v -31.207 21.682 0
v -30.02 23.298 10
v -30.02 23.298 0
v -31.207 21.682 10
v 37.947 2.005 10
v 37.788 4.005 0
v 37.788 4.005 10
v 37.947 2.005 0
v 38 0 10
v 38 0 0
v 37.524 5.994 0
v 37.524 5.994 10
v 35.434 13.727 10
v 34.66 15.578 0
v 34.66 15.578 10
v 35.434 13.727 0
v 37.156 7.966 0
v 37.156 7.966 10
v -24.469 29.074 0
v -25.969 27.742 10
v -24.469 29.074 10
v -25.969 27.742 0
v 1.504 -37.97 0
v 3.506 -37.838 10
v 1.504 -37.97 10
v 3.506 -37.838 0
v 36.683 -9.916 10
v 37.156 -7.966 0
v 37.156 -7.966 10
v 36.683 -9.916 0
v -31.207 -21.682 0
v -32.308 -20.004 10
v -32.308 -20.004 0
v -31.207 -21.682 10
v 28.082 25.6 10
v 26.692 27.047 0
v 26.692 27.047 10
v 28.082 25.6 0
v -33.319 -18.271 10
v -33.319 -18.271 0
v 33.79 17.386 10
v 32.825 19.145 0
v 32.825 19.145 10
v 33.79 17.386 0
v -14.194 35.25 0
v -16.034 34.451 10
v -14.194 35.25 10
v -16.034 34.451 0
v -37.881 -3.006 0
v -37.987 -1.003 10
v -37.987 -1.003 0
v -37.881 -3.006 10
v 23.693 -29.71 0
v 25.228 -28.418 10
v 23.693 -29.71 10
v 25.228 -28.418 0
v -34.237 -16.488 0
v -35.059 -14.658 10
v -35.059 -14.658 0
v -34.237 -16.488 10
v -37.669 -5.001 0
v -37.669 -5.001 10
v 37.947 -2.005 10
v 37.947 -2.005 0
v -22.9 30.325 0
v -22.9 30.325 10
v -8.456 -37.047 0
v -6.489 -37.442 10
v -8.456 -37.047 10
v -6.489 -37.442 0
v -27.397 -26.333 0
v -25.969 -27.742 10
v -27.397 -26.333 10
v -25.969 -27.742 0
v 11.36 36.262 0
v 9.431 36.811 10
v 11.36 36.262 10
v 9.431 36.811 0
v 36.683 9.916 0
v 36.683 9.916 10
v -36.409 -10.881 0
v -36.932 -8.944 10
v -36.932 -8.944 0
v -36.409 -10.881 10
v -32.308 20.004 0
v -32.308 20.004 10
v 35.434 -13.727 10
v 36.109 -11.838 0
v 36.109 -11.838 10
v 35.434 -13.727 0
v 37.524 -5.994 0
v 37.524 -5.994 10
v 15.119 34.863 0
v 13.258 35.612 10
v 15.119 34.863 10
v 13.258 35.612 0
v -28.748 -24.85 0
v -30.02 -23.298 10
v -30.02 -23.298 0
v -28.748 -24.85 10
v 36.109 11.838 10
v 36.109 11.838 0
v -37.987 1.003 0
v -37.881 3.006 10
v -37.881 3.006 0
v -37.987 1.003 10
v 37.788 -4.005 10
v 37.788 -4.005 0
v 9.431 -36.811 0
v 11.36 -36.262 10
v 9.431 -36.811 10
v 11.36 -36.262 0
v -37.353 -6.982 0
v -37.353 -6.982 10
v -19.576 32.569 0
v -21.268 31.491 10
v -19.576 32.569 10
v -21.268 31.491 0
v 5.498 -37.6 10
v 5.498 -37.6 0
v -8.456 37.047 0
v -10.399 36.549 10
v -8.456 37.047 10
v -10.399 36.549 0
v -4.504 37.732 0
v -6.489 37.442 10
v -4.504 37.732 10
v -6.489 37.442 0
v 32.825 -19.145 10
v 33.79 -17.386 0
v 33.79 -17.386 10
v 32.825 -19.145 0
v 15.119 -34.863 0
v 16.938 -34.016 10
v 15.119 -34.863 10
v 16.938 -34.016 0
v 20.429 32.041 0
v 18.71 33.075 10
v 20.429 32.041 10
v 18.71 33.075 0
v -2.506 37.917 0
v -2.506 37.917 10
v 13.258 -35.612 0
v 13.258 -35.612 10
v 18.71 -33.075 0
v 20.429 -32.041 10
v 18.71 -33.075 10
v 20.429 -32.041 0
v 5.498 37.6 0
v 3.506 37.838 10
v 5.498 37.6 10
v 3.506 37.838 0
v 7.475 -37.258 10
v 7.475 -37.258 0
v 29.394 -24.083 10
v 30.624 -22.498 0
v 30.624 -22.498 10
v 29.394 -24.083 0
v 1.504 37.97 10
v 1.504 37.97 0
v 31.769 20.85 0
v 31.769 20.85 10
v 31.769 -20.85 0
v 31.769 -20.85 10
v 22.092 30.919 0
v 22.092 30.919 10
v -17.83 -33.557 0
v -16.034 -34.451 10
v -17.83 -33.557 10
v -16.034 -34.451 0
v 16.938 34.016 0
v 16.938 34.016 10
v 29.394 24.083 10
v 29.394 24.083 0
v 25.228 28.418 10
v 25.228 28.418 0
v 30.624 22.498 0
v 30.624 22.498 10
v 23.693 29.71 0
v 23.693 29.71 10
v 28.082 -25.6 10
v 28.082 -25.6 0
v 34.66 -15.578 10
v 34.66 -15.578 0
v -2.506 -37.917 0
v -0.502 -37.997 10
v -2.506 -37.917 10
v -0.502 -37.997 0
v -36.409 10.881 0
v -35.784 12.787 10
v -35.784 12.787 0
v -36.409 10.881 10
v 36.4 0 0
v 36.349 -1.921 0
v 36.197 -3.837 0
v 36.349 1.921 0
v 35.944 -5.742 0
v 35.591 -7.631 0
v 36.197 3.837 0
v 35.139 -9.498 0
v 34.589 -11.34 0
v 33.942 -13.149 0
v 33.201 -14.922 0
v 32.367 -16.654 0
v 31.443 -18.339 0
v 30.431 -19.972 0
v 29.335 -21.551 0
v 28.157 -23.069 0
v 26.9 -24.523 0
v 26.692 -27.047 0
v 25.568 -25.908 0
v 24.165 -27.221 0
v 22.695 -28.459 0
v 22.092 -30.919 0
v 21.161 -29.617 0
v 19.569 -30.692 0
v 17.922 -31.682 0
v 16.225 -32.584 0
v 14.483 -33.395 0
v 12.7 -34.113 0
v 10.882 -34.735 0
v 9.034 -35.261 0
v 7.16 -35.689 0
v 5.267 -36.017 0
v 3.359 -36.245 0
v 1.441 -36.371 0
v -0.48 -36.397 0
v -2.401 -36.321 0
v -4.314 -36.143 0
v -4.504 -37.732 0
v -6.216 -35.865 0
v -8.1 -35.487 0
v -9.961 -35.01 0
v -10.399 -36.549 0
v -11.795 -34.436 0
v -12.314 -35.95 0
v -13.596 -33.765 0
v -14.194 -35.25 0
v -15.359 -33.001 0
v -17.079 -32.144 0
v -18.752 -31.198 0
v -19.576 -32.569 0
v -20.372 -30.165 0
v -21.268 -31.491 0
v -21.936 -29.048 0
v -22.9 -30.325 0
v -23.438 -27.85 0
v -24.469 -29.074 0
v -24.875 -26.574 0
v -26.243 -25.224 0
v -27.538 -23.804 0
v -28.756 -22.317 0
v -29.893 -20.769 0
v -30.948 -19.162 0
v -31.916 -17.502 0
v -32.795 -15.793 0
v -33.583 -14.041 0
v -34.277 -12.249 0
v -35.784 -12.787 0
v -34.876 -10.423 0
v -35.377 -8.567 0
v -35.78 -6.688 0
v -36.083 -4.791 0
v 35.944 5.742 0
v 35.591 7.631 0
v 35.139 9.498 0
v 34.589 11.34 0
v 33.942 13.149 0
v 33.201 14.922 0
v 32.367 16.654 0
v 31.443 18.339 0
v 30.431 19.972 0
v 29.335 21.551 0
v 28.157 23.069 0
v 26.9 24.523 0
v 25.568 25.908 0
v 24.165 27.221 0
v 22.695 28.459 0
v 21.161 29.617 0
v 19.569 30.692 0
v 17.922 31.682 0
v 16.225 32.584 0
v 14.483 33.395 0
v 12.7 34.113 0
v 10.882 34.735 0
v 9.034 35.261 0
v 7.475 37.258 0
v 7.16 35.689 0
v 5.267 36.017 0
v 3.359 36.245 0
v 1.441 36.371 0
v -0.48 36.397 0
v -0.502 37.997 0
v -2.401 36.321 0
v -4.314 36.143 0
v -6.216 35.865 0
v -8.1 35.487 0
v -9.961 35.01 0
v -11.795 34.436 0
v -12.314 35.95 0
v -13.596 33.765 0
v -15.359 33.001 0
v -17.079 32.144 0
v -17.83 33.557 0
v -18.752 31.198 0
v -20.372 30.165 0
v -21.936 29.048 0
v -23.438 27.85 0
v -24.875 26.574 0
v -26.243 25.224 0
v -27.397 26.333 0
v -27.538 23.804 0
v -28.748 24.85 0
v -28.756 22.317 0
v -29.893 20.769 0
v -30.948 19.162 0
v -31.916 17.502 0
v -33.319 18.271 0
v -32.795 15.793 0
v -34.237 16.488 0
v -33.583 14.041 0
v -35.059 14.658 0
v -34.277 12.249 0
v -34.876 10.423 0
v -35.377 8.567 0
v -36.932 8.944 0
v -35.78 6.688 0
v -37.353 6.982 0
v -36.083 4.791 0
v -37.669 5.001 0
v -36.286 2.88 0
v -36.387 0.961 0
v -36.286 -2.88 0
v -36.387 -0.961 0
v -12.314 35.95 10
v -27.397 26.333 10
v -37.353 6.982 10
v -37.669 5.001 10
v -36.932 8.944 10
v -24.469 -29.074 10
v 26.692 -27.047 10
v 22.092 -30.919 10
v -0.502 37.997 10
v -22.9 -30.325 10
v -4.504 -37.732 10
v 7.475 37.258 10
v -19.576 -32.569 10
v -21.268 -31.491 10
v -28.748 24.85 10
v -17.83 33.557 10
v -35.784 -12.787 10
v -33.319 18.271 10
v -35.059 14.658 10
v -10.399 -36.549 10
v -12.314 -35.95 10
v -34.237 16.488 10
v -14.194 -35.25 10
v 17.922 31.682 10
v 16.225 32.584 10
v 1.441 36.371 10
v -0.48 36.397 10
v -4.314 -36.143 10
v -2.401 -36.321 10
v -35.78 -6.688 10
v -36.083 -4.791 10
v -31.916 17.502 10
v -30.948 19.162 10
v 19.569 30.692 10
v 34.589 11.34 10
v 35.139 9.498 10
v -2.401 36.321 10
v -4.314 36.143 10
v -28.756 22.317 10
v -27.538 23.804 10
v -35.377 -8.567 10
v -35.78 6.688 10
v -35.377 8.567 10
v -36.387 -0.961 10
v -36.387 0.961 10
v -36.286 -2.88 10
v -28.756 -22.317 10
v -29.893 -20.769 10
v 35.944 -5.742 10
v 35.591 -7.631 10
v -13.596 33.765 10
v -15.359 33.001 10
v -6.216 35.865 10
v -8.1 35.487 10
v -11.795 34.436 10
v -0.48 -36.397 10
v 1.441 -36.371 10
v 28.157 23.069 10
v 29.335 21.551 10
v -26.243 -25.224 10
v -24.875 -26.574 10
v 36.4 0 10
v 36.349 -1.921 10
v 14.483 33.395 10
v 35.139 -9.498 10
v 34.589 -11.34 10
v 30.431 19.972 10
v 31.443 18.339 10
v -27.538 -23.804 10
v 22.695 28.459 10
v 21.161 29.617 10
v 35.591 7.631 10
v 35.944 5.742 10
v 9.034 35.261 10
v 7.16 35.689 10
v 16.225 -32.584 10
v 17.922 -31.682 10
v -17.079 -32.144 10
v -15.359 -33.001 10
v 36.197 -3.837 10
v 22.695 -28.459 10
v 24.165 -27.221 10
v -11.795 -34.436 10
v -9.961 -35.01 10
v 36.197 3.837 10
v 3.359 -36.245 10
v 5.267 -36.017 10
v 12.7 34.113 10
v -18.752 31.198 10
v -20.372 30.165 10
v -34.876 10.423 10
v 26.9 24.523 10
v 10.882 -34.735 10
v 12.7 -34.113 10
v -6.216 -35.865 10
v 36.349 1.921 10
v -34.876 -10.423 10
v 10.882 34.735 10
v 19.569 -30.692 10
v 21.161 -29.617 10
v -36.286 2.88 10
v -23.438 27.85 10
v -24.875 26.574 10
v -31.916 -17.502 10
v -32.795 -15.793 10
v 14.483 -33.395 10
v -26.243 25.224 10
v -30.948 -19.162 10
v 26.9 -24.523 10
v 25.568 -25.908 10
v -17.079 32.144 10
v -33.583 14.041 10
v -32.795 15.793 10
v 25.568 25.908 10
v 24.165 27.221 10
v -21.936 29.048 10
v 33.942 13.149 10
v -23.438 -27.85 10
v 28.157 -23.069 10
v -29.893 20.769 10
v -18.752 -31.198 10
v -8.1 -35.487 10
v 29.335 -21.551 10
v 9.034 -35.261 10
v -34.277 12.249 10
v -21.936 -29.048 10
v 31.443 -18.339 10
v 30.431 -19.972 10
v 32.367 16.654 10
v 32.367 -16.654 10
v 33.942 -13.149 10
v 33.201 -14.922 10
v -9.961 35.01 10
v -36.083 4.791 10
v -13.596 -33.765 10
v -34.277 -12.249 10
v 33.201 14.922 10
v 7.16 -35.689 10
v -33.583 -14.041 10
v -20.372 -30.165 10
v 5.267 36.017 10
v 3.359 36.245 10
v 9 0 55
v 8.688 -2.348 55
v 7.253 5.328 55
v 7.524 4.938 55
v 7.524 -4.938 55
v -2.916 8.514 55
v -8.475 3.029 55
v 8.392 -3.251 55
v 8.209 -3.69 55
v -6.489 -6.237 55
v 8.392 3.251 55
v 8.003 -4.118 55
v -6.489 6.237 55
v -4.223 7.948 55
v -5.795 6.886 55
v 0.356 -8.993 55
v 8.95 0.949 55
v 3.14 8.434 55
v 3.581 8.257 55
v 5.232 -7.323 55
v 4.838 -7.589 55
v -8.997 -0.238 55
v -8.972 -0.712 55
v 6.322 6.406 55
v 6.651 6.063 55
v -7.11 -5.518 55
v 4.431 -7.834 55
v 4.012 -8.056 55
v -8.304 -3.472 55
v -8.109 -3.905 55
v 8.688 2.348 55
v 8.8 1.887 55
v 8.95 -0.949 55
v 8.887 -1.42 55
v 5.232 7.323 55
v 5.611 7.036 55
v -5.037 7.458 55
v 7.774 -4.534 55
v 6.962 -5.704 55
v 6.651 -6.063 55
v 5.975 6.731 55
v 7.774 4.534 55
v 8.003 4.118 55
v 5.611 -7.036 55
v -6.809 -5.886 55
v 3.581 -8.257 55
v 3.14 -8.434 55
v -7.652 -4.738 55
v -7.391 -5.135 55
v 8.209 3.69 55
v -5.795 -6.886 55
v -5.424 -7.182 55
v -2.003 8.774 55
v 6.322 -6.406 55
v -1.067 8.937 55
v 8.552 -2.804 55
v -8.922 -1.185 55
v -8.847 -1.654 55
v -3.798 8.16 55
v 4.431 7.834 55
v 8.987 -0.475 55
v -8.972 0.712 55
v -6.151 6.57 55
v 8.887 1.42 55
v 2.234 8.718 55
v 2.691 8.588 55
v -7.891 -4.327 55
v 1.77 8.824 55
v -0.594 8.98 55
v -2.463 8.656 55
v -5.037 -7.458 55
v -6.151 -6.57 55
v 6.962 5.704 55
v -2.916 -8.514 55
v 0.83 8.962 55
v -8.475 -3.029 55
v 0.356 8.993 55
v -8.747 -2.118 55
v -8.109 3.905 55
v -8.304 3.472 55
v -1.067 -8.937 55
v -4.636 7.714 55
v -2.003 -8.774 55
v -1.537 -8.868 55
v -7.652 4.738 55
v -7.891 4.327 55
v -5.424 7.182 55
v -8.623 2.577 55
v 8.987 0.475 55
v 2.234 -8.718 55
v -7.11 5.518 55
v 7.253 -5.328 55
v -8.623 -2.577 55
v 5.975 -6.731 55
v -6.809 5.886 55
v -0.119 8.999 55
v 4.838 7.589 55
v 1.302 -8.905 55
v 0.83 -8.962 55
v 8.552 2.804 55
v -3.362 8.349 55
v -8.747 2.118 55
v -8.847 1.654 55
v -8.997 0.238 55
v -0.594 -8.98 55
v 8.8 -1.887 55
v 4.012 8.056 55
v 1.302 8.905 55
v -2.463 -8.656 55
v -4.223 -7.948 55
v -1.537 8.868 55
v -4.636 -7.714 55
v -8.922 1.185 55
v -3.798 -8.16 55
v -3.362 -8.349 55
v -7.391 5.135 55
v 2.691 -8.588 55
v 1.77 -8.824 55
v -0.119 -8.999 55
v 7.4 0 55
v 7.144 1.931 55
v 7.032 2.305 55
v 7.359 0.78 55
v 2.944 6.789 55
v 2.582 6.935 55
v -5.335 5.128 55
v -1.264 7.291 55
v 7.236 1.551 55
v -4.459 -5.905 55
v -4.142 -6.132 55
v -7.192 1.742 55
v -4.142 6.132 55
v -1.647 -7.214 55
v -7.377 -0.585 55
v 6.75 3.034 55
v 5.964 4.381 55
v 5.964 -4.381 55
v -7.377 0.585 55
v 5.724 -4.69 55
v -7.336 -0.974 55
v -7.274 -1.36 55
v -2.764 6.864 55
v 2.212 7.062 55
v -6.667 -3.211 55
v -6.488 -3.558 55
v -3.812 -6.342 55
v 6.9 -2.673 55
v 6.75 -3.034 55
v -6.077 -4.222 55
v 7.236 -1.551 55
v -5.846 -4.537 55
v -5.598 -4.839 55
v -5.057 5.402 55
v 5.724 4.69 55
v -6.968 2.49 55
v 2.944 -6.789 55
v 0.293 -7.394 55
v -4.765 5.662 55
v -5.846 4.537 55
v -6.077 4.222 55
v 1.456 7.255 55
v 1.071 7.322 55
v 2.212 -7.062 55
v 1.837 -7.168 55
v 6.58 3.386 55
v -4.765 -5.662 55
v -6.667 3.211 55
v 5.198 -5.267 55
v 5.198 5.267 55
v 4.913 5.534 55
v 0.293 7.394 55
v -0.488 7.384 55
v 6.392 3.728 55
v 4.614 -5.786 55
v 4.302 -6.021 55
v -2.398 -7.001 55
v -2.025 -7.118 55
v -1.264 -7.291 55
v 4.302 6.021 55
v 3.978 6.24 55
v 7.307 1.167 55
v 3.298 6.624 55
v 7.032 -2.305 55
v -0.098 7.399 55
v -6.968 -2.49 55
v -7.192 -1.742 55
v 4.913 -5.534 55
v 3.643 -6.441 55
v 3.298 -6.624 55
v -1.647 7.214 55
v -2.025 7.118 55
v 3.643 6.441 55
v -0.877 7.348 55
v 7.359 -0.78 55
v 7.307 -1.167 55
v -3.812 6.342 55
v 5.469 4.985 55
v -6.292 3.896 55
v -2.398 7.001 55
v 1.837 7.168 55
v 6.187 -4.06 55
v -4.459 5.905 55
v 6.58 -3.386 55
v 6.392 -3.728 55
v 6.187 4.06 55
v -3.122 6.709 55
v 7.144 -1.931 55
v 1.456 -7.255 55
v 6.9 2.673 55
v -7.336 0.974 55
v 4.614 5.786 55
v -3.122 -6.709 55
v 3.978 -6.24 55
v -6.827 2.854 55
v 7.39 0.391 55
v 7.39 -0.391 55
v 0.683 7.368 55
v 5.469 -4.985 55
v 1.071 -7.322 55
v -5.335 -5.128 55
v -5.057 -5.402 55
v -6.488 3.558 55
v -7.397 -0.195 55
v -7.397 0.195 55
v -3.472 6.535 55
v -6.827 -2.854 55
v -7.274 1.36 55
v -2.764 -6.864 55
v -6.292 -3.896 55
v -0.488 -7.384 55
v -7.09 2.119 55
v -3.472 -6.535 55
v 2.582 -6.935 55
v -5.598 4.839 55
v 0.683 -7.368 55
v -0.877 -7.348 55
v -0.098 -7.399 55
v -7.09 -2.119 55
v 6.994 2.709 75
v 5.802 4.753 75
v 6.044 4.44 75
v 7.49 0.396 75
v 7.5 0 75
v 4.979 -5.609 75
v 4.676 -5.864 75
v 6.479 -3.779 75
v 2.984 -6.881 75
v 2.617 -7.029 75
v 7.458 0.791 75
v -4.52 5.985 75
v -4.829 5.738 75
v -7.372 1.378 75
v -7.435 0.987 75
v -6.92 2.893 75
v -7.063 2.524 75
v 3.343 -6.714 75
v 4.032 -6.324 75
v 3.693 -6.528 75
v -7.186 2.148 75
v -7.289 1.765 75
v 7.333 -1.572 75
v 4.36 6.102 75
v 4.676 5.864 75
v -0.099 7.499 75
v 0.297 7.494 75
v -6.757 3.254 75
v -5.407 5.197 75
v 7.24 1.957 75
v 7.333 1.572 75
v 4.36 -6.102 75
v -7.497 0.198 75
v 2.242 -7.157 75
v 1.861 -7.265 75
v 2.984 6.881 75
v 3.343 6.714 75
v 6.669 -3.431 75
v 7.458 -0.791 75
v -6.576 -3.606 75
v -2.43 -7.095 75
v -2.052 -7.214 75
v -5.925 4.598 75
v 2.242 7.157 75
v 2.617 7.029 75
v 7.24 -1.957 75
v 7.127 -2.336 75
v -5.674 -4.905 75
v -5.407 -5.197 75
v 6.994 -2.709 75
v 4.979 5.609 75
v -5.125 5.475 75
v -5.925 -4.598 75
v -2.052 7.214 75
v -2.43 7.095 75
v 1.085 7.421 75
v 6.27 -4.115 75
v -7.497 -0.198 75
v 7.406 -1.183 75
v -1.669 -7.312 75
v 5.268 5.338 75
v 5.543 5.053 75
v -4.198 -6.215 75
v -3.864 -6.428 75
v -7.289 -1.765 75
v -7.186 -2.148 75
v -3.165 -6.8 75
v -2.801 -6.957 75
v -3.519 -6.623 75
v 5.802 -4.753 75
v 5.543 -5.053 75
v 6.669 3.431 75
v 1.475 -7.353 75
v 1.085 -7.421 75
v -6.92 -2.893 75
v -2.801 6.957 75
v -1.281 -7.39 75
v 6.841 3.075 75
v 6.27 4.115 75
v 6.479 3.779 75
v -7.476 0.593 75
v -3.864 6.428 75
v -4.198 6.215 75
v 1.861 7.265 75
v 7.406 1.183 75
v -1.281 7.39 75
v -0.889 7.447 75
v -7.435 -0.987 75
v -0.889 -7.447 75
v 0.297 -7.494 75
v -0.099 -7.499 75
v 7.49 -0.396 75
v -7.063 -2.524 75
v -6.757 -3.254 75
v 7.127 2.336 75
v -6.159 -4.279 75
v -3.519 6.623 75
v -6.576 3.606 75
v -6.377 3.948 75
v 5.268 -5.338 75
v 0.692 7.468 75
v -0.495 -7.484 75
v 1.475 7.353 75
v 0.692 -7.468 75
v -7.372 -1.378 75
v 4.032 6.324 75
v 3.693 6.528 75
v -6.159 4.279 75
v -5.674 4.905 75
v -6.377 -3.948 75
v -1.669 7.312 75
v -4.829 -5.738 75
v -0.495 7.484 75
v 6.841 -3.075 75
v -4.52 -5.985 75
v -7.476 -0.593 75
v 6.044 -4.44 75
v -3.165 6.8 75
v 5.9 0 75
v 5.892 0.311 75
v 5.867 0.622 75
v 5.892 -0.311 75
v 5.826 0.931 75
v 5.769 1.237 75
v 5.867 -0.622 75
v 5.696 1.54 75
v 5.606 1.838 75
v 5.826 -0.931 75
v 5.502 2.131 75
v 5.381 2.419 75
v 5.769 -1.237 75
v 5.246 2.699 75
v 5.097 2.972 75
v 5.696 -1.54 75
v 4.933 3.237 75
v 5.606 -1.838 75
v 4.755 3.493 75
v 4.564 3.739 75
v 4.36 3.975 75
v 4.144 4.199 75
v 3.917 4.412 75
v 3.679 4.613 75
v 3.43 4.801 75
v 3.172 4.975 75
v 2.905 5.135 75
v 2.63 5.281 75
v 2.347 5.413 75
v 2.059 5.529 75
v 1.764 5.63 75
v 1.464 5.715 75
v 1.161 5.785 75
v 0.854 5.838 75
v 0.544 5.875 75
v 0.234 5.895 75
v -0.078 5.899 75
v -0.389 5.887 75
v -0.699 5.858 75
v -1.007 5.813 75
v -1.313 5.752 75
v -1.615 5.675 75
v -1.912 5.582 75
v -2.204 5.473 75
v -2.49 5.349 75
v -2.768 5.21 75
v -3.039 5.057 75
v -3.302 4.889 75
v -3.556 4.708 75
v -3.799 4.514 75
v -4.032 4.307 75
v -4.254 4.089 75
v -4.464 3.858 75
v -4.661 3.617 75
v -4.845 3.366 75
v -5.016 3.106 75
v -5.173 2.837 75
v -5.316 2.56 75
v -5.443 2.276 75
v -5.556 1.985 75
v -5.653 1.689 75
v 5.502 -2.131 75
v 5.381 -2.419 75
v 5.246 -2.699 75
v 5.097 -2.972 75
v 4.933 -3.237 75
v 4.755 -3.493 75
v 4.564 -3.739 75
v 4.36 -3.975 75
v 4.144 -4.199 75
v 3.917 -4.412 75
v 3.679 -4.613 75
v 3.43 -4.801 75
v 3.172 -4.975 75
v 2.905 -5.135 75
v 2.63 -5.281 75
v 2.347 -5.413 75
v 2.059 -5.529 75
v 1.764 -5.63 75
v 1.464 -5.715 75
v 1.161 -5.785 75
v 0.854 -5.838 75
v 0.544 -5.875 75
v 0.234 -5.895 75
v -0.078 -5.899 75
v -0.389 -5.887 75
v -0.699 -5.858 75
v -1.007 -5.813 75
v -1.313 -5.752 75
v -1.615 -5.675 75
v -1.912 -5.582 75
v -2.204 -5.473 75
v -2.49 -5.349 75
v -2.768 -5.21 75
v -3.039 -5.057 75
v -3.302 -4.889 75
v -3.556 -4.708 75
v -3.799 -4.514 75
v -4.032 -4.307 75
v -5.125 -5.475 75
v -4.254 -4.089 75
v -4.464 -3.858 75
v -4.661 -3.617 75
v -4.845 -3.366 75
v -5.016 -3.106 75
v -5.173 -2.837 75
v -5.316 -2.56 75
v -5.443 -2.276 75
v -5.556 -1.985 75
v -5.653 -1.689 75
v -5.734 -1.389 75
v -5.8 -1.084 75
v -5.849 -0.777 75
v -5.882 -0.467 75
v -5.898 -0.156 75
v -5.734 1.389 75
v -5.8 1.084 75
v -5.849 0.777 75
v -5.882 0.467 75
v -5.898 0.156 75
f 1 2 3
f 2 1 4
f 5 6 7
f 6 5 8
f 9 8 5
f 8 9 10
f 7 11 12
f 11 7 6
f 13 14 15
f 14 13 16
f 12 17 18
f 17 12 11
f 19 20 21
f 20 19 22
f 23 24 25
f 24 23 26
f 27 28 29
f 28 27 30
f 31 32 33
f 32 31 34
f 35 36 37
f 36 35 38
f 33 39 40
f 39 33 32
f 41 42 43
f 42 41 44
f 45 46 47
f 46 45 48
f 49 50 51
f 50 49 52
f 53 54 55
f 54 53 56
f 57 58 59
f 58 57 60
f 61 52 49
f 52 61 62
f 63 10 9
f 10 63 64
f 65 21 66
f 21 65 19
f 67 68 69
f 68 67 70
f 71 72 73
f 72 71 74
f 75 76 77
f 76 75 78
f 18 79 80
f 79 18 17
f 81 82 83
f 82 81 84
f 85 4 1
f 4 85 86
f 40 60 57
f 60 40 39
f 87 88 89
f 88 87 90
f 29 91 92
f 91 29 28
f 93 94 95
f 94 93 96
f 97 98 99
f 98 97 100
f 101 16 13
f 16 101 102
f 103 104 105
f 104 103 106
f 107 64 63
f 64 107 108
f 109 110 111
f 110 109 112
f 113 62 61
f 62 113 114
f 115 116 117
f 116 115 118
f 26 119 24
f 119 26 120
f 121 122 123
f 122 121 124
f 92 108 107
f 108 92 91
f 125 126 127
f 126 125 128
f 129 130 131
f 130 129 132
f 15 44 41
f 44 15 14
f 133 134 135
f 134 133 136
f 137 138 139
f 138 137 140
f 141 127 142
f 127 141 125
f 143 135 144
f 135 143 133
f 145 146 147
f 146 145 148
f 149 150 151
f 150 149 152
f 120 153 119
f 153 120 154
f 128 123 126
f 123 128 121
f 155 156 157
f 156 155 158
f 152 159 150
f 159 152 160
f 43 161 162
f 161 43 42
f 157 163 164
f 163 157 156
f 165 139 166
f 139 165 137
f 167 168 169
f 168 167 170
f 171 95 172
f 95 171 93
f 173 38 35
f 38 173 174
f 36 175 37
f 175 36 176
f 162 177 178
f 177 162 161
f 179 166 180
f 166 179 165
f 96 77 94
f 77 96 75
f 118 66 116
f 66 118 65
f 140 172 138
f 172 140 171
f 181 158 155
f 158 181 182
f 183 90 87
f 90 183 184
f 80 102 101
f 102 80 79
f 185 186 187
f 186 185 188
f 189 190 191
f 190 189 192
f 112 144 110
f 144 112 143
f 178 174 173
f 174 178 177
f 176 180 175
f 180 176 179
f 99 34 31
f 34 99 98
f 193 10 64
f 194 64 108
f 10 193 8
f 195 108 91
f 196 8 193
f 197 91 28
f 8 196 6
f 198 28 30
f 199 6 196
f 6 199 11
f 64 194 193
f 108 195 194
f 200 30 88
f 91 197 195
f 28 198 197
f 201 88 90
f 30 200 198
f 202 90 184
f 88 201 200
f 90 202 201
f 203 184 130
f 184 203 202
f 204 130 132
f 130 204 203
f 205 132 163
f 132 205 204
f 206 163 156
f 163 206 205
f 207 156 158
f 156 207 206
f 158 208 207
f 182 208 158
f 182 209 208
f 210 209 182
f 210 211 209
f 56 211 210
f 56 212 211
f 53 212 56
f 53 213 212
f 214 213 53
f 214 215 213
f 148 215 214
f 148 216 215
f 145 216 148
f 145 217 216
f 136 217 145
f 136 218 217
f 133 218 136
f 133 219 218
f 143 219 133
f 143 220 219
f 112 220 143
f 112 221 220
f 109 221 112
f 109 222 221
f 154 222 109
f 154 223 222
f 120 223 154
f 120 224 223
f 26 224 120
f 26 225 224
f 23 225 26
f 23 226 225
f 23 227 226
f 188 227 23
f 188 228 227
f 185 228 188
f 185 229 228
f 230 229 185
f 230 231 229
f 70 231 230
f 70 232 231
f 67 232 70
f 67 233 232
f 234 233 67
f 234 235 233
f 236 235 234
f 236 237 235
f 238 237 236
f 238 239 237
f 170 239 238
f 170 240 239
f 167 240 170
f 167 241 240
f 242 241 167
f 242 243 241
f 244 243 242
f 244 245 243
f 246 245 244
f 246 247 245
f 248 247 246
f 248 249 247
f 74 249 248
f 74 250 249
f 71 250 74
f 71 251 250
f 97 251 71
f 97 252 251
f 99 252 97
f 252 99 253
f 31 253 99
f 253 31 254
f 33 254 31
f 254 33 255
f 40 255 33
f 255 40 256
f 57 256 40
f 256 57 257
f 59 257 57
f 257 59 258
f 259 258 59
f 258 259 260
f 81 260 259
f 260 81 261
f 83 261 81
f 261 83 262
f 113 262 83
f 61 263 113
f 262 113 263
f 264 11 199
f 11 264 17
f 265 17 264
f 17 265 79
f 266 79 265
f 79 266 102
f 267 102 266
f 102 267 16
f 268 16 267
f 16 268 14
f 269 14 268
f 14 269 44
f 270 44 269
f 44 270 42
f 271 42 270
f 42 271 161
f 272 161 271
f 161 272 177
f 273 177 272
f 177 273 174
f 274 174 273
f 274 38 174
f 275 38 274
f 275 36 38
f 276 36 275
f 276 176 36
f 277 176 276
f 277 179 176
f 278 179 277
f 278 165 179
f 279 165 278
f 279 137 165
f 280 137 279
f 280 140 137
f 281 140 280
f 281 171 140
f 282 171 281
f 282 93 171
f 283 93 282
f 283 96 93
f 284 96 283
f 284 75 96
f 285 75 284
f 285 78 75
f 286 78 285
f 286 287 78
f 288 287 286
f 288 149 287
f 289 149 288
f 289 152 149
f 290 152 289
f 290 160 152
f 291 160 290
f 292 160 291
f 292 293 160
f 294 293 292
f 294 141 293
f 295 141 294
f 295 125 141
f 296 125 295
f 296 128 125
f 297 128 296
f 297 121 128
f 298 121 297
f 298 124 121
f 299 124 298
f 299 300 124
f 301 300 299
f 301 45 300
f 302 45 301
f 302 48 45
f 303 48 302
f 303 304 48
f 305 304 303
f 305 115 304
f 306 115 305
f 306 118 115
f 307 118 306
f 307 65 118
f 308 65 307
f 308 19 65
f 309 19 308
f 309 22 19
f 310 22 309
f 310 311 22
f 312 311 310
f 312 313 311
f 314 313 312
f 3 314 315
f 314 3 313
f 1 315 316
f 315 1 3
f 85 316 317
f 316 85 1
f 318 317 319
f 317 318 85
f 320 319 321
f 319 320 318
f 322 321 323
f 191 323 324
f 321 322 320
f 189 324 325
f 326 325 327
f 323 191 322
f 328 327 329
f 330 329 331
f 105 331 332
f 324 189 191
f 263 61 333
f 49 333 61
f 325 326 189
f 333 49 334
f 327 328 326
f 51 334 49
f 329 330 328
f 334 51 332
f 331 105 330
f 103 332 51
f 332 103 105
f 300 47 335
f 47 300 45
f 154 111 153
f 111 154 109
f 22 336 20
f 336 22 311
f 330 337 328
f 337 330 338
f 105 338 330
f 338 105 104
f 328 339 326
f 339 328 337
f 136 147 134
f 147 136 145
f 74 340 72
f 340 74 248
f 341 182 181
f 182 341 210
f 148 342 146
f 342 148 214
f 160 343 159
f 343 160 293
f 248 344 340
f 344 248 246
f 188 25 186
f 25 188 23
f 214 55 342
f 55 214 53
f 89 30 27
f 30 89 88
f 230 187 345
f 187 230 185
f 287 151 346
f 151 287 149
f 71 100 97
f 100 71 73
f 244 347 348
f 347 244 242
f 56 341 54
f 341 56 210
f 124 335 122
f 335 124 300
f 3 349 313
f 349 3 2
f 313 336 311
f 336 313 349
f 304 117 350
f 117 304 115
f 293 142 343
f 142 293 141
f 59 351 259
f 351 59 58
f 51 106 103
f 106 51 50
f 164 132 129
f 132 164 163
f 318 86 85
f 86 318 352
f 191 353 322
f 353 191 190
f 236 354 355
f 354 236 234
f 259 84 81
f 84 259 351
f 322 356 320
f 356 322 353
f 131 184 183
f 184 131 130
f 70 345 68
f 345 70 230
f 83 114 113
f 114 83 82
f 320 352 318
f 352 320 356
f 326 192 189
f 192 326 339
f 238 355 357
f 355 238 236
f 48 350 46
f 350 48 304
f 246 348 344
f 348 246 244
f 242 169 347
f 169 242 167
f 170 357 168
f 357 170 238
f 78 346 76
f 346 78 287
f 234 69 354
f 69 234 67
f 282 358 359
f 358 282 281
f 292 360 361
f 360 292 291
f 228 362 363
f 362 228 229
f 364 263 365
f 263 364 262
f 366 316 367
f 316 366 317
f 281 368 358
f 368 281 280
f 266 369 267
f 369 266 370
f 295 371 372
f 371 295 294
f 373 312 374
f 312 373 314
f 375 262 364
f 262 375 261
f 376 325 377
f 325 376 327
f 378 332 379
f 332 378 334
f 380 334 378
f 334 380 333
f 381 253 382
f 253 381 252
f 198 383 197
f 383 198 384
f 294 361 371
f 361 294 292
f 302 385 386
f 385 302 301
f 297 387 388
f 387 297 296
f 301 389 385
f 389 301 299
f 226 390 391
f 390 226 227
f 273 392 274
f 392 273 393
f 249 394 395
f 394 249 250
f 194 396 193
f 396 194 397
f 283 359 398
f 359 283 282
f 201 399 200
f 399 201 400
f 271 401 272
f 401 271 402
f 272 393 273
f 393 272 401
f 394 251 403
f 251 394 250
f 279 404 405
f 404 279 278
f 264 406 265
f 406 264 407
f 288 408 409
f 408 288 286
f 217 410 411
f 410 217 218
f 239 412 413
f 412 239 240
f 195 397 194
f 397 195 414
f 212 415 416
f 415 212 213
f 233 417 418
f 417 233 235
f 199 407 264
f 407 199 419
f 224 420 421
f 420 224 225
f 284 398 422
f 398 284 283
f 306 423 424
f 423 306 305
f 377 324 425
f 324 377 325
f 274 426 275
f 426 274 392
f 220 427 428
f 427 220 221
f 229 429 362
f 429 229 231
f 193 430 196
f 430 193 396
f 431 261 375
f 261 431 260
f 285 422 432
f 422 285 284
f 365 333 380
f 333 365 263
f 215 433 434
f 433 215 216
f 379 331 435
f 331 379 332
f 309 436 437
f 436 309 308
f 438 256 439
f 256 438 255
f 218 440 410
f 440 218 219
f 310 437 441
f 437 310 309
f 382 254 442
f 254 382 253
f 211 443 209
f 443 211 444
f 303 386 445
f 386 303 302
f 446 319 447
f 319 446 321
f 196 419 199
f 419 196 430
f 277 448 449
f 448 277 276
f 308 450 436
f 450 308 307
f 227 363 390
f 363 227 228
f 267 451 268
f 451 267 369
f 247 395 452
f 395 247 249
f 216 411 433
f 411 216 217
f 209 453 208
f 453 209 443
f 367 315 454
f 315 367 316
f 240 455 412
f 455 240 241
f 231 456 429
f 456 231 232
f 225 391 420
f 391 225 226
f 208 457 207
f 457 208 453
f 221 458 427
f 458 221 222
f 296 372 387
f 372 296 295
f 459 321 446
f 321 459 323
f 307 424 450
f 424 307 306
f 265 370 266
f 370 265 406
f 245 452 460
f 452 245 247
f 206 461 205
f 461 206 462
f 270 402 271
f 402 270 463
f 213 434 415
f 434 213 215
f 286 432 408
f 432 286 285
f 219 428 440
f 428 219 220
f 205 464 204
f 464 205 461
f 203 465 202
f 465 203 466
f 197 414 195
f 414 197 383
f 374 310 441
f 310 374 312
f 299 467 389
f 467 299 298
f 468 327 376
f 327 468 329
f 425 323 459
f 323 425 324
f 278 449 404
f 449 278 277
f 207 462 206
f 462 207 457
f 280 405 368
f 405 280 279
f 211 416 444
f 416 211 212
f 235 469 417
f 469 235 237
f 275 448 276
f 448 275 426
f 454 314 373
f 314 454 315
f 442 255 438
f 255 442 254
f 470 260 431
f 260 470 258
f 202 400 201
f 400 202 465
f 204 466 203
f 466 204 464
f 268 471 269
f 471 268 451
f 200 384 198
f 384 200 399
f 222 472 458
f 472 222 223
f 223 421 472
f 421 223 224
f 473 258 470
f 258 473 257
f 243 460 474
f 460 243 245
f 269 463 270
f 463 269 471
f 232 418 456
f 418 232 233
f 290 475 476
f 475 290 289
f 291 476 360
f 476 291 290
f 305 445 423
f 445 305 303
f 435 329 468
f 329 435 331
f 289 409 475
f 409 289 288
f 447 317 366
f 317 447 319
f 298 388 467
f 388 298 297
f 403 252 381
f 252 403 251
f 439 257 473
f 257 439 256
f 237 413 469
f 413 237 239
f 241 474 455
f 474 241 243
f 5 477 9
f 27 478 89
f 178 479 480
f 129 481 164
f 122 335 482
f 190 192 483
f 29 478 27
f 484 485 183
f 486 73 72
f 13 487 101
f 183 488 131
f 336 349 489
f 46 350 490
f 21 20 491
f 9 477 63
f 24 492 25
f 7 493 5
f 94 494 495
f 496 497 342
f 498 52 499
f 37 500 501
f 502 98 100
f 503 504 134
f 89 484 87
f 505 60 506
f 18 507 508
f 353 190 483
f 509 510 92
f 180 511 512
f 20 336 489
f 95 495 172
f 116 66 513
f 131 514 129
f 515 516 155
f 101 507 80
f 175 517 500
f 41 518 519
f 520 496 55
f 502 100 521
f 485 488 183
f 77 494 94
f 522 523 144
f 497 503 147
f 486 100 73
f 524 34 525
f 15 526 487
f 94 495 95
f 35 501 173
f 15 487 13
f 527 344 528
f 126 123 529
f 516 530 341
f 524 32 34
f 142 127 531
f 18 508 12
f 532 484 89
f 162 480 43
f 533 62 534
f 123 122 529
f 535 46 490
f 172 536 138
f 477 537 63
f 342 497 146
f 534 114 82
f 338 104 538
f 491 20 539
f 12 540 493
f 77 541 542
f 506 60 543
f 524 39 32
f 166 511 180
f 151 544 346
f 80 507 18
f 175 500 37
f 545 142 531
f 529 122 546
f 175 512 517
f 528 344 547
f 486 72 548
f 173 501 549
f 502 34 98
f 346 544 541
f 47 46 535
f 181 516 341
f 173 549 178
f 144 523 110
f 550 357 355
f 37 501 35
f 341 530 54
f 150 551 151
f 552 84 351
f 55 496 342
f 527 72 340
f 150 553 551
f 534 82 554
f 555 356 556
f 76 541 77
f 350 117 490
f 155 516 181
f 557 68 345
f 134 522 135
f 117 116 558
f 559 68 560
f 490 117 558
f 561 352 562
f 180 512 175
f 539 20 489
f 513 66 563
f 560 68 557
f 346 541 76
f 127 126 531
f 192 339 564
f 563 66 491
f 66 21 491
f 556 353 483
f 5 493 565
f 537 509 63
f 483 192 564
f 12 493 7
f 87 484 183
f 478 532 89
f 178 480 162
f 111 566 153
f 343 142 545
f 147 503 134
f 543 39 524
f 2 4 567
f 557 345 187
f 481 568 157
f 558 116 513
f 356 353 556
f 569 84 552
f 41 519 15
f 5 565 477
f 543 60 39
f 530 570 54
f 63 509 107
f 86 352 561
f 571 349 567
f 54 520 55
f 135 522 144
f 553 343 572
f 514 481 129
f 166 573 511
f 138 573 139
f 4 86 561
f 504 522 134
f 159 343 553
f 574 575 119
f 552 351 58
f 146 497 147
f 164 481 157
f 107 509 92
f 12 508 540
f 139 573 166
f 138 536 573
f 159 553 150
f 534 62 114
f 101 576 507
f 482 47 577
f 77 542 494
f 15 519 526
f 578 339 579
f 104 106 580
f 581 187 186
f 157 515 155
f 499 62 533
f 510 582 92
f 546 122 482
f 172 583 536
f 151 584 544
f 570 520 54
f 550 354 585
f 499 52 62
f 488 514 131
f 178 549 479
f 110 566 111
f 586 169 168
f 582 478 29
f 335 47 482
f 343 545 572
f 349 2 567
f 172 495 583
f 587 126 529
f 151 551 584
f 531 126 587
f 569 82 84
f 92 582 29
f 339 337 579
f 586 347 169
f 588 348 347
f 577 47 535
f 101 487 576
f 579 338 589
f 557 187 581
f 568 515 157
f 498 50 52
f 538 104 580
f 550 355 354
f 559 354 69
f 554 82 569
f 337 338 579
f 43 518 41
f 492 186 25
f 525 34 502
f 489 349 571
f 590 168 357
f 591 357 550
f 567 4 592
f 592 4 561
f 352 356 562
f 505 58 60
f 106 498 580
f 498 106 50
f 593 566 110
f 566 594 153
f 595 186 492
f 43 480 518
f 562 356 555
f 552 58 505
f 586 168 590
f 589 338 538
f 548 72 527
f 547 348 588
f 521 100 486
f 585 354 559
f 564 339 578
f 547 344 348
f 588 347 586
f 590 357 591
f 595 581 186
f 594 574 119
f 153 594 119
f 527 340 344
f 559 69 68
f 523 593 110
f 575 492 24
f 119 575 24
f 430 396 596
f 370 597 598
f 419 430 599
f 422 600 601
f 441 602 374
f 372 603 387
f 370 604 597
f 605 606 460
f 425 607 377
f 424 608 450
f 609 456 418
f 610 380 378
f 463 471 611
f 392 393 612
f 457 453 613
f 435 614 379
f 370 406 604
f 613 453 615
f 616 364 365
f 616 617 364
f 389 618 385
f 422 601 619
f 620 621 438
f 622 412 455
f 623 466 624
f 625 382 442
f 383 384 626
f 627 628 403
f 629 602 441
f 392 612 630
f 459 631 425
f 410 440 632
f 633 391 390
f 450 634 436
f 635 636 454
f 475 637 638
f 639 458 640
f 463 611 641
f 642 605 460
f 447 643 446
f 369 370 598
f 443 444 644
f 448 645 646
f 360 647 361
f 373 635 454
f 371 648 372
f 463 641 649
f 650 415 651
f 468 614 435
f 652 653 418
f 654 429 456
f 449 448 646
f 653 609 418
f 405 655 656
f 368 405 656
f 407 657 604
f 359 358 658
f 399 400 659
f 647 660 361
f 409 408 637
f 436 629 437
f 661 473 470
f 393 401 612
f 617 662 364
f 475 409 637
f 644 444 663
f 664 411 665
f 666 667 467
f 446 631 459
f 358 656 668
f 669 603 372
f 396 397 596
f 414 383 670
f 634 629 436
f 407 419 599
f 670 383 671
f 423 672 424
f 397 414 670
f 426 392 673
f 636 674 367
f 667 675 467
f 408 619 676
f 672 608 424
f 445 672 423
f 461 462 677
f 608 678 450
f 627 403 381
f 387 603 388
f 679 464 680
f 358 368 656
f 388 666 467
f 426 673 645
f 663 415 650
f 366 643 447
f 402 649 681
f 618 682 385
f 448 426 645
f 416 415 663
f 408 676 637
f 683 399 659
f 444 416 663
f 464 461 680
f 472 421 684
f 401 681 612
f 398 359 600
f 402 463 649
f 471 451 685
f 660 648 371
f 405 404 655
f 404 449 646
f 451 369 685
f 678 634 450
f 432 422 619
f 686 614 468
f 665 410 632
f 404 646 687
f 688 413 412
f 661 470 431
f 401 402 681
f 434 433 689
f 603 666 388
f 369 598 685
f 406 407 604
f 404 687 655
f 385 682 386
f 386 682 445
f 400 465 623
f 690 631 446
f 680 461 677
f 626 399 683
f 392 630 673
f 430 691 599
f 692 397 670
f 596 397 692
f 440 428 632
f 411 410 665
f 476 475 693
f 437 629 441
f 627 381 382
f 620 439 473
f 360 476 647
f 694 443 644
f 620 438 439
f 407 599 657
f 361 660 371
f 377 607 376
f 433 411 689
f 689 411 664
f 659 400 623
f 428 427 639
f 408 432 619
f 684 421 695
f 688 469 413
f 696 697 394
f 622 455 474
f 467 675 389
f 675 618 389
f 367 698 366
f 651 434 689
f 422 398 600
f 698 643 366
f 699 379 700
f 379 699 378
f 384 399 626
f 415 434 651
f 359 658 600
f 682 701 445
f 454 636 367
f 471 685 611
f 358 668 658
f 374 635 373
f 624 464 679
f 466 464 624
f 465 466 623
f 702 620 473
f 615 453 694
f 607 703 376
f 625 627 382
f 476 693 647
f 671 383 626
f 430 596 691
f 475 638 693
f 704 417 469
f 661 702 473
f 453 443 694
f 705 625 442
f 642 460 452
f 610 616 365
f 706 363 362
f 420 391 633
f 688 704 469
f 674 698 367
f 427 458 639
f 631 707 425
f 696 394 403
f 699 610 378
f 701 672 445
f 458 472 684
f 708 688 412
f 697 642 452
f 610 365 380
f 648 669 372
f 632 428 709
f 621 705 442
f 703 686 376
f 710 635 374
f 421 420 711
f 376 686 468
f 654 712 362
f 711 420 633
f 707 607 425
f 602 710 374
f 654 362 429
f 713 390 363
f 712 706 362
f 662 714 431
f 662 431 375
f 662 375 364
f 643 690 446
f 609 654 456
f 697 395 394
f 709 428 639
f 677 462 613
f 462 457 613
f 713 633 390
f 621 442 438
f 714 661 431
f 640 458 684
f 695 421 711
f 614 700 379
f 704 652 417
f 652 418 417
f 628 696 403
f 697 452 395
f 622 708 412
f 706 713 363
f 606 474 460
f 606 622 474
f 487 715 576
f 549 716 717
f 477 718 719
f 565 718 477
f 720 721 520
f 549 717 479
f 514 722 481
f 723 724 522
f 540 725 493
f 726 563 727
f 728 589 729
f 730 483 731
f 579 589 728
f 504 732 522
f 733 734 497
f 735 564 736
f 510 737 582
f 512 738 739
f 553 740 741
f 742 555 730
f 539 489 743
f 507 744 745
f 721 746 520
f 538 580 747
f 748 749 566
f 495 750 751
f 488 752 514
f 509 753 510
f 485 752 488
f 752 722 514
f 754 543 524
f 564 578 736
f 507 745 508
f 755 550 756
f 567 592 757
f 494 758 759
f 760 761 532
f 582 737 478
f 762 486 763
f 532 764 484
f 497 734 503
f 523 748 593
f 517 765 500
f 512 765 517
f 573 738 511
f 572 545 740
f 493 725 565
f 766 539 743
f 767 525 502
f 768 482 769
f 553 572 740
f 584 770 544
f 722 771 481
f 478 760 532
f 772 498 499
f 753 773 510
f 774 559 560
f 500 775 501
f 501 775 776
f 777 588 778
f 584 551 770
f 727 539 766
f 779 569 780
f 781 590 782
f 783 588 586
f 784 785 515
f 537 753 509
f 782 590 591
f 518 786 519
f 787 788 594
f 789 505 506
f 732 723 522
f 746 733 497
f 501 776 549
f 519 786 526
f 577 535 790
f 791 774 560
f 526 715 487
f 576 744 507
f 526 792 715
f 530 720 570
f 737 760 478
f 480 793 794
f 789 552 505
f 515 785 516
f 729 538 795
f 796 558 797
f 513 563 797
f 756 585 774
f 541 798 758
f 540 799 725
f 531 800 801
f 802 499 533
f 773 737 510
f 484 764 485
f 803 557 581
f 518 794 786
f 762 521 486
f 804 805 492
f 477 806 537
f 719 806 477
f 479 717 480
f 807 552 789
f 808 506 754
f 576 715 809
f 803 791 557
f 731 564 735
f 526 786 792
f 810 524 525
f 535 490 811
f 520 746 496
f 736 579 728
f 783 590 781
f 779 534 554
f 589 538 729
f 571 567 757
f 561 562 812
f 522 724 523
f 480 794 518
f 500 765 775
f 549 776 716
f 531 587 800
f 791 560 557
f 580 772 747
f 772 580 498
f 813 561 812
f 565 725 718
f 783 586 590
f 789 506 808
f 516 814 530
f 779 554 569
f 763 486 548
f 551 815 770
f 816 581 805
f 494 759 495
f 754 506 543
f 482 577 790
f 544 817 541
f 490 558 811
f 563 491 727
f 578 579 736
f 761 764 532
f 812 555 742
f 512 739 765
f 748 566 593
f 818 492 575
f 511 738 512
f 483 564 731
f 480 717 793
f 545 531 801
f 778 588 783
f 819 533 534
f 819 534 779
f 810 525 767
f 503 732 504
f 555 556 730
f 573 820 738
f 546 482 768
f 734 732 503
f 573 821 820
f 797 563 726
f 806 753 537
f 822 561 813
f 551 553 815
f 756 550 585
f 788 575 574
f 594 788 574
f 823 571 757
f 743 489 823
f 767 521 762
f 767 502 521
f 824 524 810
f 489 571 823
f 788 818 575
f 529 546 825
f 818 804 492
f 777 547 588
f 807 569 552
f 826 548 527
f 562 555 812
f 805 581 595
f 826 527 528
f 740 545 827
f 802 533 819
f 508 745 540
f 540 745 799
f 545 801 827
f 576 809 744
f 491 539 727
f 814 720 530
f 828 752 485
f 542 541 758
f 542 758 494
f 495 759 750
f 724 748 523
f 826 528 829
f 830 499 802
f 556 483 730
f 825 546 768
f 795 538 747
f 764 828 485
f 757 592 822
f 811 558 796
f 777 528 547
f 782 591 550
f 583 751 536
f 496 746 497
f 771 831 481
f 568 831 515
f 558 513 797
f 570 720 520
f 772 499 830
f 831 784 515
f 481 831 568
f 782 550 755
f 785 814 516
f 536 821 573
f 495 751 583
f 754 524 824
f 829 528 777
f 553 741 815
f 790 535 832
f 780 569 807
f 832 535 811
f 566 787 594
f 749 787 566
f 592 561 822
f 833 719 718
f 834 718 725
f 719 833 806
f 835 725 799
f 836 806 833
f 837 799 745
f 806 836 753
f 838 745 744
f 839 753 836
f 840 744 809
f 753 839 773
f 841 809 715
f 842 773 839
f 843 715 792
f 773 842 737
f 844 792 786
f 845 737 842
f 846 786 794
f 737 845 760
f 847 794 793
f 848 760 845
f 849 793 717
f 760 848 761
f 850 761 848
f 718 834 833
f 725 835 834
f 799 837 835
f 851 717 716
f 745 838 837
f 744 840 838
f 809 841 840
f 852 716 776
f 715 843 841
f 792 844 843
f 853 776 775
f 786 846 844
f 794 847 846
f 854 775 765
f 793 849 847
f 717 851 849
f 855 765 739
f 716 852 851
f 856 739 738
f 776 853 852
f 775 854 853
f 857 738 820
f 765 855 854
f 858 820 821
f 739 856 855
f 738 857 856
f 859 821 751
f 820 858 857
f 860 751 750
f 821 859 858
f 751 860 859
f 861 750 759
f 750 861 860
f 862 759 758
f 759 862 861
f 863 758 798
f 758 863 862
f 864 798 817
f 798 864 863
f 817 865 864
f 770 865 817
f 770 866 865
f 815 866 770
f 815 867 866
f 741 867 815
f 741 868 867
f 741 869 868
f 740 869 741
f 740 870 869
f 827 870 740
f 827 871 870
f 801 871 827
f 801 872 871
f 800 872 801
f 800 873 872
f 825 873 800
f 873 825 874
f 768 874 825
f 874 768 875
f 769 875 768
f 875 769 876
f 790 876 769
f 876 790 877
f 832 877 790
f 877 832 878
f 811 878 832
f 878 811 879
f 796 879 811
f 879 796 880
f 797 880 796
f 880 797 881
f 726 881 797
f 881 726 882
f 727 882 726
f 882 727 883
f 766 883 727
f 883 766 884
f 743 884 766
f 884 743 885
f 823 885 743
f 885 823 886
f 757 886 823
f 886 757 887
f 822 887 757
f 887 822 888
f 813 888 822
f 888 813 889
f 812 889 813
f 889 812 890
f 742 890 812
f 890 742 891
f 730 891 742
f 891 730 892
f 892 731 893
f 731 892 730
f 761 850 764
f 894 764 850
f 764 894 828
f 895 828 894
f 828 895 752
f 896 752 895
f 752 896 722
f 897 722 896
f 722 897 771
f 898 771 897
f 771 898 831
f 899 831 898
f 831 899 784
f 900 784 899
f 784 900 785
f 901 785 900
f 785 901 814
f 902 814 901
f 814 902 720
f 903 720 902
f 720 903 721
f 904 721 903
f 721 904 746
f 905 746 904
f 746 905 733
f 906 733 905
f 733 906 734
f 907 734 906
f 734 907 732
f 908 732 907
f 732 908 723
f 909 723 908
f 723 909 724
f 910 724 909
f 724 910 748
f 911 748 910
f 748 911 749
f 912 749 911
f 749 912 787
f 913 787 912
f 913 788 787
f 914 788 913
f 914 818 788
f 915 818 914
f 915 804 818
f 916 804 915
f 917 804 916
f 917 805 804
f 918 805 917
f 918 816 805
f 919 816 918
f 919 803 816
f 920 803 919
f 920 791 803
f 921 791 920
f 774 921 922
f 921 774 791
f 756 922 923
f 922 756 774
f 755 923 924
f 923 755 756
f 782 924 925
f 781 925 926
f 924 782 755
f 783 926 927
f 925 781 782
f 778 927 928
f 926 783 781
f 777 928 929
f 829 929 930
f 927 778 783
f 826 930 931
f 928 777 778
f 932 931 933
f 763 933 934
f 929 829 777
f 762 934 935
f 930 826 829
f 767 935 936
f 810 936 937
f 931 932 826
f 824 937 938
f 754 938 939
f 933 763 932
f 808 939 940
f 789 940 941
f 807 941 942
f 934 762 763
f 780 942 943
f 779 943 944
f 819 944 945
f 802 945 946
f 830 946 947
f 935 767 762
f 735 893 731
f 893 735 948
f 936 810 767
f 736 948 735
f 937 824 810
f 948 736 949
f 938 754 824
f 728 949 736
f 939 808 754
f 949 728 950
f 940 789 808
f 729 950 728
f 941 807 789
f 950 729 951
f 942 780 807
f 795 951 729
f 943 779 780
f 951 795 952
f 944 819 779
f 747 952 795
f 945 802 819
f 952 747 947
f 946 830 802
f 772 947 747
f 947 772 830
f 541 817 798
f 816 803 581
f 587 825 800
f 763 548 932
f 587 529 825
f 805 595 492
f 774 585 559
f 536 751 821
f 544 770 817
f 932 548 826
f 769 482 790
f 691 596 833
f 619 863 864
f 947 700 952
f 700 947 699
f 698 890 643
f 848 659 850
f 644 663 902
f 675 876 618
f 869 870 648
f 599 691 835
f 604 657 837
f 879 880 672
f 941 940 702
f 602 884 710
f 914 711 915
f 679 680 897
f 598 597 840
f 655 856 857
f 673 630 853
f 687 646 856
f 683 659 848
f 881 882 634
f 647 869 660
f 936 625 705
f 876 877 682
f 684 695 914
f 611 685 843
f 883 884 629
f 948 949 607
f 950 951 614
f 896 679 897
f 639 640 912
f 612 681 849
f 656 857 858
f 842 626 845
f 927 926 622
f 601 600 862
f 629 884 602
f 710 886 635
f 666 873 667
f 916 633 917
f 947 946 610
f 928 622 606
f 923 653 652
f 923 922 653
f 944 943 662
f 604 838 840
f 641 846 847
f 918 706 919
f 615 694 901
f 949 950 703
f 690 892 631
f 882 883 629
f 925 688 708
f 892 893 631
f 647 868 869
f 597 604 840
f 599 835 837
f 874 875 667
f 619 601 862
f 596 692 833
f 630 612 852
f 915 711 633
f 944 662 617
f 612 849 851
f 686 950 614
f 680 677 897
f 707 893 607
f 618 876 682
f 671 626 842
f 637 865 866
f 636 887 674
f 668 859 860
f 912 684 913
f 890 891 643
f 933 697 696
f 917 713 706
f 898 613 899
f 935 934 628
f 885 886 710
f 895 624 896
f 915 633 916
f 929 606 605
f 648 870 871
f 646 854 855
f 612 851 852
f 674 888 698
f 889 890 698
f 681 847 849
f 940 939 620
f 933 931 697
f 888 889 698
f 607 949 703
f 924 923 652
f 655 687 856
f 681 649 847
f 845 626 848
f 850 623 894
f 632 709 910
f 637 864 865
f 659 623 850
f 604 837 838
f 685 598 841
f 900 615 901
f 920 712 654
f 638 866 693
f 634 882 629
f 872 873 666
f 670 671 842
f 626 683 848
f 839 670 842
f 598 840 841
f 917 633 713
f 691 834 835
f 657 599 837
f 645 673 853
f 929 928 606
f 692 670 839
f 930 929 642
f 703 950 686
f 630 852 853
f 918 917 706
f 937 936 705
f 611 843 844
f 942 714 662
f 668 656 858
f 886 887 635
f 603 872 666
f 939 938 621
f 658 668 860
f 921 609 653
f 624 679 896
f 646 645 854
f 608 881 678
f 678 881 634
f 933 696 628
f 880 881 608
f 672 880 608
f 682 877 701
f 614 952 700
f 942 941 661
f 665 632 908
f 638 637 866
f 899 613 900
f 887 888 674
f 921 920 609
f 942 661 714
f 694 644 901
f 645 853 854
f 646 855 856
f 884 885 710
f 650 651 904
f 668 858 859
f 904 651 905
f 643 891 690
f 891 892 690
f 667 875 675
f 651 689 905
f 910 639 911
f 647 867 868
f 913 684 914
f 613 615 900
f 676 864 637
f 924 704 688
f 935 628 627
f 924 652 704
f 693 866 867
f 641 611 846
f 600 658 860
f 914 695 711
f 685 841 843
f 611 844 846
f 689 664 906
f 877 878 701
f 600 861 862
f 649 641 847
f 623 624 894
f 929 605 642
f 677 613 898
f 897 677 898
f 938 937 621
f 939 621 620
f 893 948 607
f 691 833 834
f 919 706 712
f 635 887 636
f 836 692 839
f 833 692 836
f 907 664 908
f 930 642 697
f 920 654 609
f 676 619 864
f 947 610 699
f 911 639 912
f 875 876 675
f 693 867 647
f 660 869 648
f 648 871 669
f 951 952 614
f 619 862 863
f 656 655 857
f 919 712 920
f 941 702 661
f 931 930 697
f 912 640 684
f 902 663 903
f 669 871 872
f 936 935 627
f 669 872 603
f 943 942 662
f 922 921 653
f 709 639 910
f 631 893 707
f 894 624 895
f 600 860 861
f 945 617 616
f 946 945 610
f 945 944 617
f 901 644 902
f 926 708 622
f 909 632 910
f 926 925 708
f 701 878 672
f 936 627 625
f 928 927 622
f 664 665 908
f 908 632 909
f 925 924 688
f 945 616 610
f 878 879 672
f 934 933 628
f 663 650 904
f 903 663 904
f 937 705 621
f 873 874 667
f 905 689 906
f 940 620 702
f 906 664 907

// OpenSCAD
//Simple funnel
//embudo sencillo
//define 3 radius dimensions
//define 3 heigths 
//define thickness

// total height 75

R1=38;
R2=9;
R3=7.5;

H0=10;
H1desired=45; 
H1=max(H1desired,R1-R2);//to prevent overhangs <45º, H1>R1-R2
H2=20;



thick=0.8;//you might want to take into account your nozzle size

Sides=3.15*R1;//feel free to replace the formula by any number



difference() {

cylinder (h=H0, r=R1, $fn=Sides);
cylinder (h=H0, r=R1-2*thick,  $fn=Sides);
} // end difference


translate ( [0,0,H0])
difference() {

cylinder (h=H1, r1=R1, r2=R2,  $fn=Sides);
cylinder (h=H1, r1=R1-2*thick, r2=R2-2*thick,  $fn=Sides);
} // end difference

translate ( [0,0,H0+H1])
difference() {

cylinder (h=H2, r1=R2, r2=R3,  $fn=Sides);
cylinder (h=H2, r1=R2-2*thick, r2=R3-2*thick,  $fn=Sides);
} // end difference
